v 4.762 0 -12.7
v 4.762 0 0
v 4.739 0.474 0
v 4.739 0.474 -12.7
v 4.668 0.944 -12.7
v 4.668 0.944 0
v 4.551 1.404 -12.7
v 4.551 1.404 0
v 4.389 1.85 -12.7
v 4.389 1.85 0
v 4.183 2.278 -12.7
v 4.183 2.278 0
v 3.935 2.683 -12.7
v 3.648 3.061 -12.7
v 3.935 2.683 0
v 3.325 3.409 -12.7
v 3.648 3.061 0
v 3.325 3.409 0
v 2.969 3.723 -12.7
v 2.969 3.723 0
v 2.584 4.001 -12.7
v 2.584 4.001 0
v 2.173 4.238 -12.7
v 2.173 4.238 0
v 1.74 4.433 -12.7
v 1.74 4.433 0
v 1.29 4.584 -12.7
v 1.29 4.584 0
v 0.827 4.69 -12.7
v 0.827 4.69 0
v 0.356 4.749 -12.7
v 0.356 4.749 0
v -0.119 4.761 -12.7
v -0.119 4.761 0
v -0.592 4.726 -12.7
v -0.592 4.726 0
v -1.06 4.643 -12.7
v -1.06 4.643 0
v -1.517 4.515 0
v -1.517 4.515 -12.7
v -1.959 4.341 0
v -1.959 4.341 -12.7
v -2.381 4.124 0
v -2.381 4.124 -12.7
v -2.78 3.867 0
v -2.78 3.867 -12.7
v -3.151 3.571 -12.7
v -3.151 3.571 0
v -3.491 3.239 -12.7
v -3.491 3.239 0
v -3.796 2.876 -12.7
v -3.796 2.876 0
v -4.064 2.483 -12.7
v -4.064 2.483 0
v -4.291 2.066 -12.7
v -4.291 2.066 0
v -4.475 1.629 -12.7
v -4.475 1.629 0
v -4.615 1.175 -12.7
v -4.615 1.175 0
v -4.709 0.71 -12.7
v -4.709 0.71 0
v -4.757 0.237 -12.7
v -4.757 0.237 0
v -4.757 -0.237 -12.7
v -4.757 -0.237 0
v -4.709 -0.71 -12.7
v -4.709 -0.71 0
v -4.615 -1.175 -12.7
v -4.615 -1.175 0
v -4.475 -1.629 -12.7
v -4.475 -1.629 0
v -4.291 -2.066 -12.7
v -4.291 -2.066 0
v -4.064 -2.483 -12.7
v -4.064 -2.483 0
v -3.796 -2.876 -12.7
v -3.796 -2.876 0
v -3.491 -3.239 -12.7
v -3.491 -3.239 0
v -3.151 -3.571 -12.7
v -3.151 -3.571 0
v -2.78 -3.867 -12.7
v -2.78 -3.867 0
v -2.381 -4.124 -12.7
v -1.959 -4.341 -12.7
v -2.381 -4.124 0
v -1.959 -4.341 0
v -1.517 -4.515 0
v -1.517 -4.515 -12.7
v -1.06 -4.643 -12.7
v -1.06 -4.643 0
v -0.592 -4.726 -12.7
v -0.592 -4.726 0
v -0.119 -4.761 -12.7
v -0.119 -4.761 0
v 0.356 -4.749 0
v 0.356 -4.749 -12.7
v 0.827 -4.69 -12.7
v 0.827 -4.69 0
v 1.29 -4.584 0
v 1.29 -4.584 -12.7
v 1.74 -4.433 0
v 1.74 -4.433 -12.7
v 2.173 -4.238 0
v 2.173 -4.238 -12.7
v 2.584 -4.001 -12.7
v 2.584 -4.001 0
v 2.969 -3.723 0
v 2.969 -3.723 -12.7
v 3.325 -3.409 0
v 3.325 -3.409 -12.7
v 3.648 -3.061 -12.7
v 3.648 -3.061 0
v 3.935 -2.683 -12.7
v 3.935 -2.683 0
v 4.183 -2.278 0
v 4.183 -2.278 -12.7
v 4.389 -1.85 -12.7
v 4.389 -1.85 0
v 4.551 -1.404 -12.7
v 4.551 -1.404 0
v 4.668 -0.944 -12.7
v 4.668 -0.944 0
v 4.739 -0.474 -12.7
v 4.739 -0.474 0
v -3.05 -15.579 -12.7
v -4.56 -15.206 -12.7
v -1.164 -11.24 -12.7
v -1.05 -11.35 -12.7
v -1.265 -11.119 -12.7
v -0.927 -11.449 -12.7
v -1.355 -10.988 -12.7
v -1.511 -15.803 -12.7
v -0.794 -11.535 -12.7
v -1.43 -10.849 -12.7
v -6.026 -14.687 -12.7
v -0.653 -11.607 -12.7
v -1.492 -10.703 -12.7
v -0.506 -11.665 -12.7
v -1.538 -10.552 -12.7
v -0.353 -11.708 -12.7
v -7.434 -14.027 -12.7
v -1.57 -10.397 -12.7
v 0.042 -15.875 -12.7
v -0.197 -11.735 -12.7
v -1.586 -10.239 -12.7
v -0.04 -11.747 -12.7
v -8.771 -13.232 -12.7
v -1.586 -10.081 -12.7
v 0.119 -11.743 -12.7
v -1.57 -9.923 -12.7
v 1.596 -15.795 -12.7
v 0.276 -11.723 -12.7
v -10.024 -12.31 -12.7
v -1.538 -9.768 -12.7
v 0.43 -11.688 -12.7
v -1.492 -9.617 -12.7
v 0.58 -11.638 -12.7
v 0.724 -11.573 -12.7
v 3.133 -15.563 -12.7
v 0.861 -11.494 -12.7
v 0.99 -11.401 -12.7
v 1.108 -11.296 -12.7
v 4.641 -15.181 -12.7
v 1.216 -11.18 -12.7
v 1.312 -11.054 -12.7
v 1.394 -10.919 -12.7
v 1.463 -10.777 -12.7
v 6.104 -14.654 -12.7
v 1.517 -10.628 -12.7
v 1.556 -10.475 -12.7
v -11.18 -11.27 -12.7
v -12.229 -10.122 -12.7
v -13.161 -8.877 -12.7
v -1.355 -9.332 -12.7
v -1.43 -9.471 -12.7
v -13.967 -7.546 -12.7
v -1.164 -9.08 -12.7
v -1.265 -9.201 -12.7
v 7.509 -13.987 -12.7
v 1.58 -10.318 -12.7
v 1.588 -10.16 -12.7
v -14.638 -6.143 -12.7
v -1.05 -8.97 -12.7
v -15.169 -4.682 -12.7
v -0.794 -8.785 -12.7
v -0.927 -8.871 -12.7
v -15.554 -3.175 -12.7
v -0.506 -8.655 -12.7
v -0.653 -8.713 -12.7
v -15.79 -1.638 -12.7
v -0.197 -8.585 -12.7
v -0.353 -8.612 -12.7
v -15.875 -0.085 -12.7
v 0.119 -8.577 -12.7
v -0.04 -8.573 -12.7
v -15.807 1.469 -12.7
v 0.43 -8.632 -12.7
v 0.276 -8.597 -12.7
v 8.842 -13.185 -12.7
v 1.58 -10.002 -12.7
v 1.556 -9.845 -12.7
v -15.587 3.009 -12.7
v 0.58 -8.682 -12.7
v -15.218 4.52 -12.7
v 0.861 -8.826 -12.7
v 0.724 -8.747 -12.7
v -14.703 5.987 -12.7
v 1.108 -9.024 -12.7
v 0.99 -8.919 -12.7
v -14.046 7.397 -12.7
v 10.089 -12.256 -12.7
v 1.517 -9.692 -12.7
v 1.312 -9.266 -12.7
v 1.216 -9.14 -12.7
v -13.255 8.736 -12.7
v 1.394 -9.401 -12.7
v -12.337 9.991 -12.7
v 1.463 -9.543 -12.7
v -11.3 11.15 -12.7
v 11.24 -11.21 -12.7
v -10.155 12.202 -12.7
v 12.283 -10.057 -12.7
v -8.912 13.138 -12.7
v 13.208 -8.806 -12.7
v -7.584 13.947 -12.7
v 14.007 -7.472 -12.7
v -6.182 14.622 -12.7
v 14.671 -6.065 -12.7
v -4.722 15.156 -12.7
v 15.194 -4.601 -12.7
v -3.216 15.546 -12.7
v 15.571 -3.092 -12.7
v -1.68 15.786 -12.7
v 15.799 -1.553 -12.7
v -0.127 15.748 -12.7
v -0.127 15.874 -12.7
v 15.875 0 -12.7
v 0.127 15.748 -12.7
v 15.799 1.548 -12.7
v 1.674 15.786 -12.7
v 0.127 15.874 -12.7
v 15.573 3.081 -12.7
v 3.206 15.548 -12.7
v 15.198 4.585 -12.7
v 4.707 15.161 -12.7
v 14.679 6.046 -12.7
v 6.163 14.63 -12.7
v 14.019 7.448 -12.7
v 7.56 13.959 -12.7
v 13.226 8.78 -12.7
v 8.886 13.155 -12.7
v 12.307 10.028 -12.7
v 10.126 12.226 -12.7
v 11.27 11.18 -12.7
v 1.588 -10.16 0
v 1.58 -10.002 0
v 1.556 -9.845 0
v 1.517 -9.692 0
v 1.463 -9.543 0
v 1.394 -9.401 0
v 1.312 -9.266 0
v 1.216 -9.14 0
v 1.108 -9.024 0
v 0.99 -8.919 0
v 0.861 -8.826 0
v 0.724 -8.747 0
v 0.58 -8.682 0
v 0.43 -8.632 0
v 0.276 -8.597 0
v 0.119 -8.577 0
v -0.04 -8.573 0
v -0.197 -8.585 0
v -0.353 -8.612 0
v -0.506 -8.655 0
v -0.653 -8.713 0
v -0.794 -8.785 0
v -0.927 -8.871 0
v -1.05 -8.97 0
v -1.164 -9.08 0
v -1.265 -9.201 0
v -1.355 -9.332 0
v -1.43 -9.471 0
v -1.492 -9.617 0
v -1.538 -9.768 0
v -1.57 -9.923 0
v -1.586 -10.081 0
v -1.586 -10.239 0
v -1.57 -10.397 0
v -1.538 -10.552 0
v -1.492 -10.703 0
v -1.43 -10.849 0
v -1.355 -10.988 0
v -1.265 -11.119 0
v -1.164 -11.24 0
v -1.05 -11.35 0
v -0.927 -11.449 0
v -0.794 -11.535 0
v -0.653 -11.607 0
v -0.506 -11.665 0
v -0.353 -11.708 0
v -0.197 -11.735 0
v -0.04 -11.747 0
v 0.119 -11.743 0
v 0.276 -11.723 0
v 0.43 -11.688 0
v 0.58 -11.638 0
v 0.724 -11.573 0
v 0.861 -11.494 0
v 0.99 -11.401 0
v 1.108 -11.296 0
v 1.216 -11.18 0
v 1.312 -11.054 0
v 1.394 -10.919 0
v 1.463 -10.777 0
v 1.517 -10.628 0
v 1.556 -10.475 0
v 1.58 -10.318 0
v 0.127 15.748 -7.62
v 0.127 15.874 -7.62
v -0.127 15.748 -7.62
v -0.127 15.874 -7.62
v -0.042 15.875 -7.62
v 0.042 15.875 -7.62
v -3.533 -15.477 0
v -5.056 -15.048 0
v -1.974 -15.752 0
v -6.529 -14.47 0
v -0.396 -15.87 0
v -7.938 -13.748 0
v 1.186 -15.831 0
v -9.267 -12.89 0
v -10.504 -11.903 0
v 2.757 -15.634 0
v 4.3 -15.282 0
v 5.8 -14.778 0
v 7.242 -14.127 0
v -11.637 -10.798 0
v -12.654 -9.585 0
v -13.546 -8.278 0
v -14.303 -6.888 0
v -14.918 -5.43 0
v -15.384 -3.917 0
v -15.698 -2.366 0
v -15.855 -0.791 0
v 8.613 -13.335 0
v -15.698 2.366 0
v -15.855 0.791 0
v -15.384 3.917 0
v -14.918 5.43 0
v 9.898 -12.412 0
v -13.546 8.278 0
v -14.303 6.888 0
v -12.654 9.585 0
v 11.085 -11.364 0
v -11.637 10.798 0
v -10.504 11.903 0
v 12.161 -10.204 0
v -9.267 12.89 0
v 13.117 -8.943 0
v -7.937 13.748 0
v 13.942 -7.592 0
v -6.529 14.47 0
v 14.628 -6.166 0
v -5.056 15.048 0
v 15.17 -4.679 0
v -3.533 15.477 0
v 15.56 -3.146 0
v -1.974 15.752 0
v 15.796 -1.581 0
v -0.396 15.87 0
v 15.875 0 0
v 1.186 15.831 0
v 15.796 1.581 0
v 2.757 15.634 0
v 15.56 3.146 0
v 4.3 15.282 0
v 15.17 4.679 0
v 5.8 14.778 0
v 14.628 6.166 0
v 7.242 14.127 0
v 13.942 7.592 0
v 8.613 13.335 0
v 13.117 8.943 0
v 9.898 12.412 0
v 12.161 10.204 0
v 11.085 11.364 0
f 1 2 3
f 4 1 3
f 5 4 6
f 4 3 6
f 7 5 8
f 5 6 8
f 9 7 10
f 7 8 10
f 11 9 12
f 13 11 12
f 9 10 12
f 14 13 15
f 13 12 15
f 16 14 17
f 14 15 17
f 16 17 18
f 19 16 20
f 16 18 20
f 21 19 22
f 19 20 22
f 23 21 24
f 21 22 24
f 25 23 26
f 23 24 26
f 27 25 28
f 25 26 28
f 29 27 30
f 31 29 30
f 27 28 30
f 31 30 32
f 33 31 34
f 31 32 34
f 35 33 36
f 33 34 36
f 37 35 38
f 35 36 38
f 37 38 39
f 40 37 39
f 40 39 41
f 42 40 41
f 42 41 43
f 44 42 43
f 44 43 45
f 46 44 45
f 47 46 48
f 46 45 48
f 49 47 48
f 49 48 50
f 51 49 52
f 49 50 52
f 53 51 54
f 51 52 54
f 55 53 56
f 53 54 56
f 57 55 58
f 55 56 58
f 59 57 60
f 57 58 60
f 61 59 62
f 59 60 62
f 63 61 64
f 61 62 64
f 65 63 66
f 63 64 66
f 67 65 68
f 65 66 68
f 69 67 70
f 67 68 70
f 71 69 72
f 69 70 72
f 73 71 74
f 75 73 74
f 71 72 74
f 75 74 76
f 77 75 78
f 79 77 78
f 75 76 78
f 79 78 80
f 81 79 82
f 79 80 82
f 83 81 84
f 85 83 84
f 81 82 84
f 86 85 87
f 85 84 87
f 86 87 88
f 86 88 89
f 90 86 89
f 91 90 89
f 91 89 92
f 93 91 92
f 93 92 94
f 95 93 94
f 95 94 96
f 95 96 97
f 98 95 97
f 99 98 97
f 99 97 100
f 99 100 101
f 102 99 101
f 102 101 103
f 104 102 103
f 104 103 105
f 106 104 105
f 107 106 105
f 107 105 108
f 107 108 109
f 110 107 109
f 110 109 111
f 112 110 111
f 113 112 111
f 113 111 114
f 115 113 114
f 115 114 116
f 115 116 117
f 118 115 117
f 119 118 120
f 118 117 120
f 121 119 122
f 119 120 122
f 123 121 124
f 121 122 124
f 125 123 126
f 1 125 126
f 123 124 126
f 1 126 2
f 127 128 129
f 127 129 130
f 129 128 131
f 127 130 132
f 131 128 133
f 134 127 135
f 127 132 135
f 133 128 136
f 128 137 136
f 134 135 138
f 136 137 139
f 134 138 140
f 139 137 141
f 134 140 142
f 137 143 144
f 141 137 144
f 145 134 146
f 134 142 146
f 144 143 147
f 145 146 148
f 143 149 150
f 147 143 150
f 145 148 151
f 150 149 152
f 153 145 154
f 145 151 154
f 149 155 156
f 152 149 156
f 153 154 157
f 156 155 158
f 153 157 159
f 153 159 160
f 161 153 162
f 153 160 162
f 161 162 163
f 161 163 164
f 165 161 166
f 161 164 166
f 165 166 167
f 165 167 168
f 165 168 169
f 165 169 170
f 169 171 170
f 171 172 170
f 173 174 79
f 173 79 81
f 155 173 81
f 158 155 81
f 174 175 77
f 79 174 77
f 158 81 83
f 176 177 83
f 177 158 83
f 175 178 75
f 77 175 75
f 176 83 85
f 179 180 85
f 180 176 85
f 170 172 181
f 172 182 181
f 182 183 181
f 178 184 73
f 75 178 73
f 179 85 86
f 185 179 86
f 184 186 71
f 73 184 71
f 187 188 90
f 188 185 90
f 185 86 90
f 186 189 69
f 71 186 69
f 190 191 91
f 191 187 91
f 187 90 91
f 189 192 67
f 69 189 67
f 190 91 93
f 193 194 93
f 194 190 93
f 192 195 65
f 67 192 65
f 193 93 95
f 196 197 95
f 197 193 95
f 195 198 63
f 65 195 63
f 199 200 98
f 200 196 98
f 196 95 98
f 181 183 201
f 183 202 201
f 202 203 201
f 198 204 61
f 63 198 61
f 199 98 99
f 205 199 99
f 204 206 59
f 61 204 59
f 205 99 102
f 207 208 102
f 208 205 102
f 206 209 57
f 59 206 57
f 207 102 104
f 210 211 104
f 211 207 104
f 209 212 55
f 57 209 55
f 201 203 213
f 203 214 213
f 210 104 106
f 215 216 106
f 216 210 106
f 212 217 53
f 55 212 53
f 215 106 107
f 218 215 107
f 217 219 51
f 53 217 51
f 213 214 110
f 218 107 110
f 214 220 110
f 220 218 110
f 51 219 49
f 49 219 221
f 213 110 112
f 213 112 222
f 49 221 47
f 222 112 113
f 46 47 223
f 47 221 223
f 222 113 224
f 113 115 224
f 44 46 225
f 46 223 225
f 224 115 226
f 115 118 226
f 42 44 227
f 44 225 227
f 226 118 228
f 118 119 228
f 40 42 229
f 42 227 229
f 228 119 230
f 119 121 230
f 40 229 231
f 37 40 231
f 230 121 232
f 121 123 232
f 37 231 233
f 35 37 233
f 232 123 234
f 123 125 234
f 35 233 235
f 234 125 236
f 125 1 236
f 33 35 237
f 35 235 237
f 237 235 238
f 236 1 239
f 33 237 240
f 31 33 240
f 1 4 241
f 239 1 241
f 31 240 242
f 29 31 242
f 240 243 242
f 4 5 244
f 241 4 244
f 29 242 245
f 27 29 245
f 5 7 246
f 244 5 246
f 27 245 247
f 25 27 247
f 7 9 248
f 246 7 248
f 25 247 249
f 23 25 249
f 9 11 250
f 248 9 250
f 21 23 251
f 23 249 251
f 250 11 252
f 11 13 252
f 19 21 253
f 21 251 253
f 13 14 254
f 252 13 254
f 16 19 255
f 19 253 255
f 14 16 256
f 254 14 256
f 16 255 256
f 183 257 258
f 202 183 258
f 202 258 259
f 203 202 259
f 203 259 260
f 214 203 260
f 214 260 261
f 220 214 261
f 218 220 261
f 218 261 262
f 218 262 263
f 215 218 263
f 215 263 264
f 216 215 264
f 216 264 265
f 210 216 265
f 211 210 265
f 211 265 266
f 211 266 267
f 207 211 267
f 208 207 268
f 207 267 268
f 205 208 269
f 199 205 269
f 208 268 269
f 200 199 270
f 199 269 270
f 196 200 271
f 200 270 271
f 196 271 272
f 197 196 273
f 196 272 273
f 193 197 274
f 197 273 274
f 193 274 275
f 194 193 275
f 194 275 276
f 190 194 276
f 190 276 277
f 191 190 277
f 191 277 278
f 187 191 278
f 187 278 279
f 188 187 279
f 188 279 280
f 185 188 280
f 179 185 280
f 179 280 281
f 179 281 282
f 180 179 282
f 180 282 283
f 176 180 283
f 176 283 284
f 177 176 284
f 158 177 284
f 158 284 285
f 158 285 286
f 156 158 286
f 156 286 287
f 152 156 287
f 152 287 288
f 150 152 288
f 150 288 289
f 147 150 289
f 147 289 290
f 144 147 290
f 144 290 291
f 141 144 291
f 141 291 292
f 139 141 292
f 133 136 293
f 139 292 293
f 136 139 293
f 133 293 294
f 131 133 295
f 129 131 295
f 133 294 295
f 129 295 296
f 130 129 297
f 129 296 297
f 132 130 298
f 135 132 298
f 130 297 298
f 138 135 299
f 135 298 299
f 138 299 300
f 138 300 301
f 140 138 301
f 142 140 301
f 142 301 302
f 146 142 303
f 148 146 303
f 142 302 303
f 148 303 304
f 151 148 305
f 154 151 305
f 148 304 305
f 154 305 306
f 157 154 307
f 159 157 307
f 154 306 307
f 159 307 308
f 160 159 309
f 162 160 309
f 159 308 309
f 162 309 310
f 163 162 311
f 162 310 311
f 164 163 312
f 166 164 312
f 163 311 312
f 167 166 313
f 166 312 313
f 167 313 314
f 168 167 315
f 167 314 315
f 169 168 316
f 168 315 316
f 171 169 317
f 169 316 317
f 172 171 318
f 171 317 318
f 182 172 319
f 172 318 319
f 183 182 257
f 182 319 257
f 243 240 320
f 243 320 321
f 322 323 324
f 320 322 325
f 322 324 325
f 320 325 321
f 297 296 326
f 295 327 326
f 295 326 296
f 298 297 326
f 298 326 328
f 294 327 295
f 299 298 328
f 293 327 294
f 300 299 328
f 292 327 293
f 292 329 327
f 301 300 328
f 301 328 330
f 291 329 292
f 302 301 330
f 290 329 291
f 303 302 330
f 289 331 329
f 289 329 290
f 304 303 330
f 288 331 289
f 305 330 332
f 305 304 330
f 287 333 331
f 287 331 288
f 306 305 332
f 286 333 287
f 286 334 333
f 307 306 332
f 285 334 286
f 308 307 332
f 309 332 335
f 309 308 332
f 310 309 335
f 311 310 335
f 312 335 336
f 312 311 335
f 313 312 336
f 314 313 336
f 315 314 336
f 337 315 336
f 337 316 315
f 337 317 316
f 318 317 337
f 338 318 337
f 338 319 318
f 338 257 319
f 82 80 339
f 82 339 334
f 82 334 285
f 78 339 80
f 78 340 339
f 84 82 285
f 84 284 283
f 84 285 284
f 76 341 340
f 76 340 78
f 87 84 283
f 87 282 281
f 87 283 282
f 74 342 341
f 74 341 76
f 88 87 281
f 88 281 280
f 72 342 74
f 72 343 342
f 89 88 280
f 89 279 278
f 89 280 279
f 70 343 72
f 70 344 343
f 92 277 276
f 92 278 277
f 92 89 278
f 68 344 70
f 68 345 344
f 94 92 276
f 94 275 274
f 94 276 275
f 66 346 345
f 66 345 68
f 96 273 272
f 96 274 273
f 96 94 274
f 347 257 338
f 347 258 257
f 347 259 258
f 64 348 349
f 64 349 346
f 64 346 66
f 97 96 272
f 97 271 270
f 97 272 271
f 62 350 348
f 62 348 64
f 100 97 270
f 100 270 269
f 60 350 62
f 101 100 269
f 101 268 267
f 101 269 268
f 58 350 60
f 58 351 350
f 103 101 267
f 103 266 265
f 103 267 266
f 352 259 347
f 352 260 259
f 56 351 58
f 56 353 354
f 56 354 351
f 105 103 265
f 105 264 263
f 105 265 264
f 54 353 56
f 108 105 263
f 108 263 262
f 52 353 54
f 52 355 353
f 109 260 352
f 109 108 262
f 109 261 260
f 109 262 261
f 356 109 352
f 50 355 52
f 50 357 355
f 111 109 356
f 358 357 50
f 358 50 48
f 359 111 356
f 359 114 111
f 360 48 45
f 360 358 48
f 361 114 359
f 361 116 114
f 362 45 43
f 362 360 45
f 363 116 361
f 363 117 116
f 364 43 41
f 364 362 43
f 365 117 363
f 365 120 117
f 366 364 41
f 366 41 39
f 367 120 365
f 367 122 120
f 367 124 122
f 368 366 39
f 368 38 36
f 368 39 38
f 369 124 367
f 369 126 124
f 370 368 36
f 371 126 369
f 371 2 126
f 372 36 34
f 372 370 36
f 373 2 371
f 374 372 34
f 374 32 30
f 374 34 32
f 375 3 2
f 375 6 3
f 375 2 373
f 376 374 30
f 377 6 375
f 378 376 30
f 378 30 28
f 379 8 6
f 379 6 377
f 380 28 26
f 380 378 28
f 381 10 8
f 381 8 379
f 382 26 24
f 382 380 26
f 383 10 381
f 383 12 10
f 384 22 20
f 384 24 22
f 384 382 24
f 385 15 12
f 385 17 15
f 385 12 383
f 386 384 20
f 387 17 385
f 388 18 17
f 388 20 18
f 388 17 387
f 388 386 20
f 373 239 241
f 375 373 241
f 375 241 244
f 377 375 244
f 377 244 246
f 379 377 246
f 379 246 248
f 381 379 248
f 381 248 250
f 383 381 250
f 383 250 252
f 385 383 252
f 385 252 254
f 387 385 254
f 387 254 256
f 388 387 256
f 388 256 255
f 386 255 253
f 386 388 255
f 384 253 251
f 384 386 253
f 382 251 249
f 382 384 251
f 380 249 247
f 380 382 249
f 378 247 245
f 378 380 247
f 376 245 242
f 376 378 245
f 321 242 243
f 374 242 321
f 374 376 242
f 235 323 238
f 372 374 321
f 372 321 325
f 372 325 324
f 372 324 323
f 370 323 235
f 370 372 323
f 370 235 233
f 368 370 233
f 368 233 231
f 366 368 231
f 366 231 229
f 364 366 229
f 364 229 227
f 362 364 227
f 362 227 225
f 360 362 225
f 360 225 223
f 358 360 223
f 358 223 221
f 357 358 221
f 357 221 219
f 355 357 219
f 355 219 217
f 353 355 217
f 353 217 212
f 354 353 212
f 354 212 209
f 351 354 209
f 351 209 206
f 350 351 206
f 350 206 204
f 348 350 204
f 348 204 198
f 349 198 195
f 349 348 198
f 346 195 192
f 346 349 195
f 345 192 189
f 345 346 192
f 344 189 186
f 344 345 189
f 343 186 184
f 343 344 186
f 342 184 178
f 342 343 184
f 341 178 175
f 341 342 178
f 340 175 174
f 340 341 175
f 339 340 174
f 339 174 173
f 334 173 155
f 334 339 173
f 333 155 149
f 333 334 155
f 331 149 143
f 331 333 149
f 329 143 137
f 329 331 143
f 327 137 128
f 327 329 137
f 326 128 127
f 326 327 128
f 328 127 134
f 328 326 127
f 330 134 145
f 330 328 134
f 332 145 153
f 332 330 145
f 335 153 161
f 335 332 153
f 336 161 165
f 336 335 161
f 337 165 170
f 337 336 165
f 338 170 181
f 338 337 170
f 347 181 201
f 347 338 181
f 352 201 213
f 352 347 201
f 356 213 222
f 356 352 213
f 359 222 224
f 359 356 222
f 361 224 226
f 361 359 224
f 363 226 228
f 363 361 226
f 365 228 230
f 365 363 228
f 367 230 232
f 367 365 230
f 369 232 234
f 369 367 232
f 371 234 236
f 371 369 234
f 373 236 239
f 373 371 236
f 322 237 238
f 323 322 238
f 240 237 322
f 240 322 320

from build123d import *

# Parameters (mm, degrees)
SKETCH1_R                     = 15.875
SKETCH1_R_2                   = 4.7625
BOSS_EXTRUDE1_DEPTH           = 12.7
SKETCH3_W                     = 0.254
SKETCH3_H                     = 0.127
F_001_LINE_CUT_EXTRUDE1_DEPTH = 5.08
F_1_8_0_1250_DOWEL_HOLE1_D    = 3.175


with BuildPart() as part:
    # Sketch1 → Boss-Extrude1 (new body)
    with BuildSketch(Plane.XY):
        Circle(SKETCH1_R)
        Circle(SKETCH1_R_2, mode=Mode.SUBTRACT)
    extrude(amount=-BOSS_EXTRUDE1_DEPTH)

    # Sketch3 → .001 line Cut-Extrude1 (cut)
    with BuildSketch(Plane.XY.offset(-12.7)):
        with Locations((0, 15.8115)):
            Rectangle(SKETCH3_W, SKETCH3_H)
    extrude(amount=F_001_LINE_CUT_EXTRUDE1_DEPTH, mode=Mode.SUBTRACT)

    # 1/8 (0.1250) Dowel Hole1 (through all)
    with Locations(Plane(origin=(0, 0, -12.7), x_dir=(-1, 0, 0), z_dir=(0, 0, -1))):
        with Locations((0, -10.16)):
            Hole(F_1_8_0_1250_DOWEL_HOLE1_D / 2)


solid = part.part
